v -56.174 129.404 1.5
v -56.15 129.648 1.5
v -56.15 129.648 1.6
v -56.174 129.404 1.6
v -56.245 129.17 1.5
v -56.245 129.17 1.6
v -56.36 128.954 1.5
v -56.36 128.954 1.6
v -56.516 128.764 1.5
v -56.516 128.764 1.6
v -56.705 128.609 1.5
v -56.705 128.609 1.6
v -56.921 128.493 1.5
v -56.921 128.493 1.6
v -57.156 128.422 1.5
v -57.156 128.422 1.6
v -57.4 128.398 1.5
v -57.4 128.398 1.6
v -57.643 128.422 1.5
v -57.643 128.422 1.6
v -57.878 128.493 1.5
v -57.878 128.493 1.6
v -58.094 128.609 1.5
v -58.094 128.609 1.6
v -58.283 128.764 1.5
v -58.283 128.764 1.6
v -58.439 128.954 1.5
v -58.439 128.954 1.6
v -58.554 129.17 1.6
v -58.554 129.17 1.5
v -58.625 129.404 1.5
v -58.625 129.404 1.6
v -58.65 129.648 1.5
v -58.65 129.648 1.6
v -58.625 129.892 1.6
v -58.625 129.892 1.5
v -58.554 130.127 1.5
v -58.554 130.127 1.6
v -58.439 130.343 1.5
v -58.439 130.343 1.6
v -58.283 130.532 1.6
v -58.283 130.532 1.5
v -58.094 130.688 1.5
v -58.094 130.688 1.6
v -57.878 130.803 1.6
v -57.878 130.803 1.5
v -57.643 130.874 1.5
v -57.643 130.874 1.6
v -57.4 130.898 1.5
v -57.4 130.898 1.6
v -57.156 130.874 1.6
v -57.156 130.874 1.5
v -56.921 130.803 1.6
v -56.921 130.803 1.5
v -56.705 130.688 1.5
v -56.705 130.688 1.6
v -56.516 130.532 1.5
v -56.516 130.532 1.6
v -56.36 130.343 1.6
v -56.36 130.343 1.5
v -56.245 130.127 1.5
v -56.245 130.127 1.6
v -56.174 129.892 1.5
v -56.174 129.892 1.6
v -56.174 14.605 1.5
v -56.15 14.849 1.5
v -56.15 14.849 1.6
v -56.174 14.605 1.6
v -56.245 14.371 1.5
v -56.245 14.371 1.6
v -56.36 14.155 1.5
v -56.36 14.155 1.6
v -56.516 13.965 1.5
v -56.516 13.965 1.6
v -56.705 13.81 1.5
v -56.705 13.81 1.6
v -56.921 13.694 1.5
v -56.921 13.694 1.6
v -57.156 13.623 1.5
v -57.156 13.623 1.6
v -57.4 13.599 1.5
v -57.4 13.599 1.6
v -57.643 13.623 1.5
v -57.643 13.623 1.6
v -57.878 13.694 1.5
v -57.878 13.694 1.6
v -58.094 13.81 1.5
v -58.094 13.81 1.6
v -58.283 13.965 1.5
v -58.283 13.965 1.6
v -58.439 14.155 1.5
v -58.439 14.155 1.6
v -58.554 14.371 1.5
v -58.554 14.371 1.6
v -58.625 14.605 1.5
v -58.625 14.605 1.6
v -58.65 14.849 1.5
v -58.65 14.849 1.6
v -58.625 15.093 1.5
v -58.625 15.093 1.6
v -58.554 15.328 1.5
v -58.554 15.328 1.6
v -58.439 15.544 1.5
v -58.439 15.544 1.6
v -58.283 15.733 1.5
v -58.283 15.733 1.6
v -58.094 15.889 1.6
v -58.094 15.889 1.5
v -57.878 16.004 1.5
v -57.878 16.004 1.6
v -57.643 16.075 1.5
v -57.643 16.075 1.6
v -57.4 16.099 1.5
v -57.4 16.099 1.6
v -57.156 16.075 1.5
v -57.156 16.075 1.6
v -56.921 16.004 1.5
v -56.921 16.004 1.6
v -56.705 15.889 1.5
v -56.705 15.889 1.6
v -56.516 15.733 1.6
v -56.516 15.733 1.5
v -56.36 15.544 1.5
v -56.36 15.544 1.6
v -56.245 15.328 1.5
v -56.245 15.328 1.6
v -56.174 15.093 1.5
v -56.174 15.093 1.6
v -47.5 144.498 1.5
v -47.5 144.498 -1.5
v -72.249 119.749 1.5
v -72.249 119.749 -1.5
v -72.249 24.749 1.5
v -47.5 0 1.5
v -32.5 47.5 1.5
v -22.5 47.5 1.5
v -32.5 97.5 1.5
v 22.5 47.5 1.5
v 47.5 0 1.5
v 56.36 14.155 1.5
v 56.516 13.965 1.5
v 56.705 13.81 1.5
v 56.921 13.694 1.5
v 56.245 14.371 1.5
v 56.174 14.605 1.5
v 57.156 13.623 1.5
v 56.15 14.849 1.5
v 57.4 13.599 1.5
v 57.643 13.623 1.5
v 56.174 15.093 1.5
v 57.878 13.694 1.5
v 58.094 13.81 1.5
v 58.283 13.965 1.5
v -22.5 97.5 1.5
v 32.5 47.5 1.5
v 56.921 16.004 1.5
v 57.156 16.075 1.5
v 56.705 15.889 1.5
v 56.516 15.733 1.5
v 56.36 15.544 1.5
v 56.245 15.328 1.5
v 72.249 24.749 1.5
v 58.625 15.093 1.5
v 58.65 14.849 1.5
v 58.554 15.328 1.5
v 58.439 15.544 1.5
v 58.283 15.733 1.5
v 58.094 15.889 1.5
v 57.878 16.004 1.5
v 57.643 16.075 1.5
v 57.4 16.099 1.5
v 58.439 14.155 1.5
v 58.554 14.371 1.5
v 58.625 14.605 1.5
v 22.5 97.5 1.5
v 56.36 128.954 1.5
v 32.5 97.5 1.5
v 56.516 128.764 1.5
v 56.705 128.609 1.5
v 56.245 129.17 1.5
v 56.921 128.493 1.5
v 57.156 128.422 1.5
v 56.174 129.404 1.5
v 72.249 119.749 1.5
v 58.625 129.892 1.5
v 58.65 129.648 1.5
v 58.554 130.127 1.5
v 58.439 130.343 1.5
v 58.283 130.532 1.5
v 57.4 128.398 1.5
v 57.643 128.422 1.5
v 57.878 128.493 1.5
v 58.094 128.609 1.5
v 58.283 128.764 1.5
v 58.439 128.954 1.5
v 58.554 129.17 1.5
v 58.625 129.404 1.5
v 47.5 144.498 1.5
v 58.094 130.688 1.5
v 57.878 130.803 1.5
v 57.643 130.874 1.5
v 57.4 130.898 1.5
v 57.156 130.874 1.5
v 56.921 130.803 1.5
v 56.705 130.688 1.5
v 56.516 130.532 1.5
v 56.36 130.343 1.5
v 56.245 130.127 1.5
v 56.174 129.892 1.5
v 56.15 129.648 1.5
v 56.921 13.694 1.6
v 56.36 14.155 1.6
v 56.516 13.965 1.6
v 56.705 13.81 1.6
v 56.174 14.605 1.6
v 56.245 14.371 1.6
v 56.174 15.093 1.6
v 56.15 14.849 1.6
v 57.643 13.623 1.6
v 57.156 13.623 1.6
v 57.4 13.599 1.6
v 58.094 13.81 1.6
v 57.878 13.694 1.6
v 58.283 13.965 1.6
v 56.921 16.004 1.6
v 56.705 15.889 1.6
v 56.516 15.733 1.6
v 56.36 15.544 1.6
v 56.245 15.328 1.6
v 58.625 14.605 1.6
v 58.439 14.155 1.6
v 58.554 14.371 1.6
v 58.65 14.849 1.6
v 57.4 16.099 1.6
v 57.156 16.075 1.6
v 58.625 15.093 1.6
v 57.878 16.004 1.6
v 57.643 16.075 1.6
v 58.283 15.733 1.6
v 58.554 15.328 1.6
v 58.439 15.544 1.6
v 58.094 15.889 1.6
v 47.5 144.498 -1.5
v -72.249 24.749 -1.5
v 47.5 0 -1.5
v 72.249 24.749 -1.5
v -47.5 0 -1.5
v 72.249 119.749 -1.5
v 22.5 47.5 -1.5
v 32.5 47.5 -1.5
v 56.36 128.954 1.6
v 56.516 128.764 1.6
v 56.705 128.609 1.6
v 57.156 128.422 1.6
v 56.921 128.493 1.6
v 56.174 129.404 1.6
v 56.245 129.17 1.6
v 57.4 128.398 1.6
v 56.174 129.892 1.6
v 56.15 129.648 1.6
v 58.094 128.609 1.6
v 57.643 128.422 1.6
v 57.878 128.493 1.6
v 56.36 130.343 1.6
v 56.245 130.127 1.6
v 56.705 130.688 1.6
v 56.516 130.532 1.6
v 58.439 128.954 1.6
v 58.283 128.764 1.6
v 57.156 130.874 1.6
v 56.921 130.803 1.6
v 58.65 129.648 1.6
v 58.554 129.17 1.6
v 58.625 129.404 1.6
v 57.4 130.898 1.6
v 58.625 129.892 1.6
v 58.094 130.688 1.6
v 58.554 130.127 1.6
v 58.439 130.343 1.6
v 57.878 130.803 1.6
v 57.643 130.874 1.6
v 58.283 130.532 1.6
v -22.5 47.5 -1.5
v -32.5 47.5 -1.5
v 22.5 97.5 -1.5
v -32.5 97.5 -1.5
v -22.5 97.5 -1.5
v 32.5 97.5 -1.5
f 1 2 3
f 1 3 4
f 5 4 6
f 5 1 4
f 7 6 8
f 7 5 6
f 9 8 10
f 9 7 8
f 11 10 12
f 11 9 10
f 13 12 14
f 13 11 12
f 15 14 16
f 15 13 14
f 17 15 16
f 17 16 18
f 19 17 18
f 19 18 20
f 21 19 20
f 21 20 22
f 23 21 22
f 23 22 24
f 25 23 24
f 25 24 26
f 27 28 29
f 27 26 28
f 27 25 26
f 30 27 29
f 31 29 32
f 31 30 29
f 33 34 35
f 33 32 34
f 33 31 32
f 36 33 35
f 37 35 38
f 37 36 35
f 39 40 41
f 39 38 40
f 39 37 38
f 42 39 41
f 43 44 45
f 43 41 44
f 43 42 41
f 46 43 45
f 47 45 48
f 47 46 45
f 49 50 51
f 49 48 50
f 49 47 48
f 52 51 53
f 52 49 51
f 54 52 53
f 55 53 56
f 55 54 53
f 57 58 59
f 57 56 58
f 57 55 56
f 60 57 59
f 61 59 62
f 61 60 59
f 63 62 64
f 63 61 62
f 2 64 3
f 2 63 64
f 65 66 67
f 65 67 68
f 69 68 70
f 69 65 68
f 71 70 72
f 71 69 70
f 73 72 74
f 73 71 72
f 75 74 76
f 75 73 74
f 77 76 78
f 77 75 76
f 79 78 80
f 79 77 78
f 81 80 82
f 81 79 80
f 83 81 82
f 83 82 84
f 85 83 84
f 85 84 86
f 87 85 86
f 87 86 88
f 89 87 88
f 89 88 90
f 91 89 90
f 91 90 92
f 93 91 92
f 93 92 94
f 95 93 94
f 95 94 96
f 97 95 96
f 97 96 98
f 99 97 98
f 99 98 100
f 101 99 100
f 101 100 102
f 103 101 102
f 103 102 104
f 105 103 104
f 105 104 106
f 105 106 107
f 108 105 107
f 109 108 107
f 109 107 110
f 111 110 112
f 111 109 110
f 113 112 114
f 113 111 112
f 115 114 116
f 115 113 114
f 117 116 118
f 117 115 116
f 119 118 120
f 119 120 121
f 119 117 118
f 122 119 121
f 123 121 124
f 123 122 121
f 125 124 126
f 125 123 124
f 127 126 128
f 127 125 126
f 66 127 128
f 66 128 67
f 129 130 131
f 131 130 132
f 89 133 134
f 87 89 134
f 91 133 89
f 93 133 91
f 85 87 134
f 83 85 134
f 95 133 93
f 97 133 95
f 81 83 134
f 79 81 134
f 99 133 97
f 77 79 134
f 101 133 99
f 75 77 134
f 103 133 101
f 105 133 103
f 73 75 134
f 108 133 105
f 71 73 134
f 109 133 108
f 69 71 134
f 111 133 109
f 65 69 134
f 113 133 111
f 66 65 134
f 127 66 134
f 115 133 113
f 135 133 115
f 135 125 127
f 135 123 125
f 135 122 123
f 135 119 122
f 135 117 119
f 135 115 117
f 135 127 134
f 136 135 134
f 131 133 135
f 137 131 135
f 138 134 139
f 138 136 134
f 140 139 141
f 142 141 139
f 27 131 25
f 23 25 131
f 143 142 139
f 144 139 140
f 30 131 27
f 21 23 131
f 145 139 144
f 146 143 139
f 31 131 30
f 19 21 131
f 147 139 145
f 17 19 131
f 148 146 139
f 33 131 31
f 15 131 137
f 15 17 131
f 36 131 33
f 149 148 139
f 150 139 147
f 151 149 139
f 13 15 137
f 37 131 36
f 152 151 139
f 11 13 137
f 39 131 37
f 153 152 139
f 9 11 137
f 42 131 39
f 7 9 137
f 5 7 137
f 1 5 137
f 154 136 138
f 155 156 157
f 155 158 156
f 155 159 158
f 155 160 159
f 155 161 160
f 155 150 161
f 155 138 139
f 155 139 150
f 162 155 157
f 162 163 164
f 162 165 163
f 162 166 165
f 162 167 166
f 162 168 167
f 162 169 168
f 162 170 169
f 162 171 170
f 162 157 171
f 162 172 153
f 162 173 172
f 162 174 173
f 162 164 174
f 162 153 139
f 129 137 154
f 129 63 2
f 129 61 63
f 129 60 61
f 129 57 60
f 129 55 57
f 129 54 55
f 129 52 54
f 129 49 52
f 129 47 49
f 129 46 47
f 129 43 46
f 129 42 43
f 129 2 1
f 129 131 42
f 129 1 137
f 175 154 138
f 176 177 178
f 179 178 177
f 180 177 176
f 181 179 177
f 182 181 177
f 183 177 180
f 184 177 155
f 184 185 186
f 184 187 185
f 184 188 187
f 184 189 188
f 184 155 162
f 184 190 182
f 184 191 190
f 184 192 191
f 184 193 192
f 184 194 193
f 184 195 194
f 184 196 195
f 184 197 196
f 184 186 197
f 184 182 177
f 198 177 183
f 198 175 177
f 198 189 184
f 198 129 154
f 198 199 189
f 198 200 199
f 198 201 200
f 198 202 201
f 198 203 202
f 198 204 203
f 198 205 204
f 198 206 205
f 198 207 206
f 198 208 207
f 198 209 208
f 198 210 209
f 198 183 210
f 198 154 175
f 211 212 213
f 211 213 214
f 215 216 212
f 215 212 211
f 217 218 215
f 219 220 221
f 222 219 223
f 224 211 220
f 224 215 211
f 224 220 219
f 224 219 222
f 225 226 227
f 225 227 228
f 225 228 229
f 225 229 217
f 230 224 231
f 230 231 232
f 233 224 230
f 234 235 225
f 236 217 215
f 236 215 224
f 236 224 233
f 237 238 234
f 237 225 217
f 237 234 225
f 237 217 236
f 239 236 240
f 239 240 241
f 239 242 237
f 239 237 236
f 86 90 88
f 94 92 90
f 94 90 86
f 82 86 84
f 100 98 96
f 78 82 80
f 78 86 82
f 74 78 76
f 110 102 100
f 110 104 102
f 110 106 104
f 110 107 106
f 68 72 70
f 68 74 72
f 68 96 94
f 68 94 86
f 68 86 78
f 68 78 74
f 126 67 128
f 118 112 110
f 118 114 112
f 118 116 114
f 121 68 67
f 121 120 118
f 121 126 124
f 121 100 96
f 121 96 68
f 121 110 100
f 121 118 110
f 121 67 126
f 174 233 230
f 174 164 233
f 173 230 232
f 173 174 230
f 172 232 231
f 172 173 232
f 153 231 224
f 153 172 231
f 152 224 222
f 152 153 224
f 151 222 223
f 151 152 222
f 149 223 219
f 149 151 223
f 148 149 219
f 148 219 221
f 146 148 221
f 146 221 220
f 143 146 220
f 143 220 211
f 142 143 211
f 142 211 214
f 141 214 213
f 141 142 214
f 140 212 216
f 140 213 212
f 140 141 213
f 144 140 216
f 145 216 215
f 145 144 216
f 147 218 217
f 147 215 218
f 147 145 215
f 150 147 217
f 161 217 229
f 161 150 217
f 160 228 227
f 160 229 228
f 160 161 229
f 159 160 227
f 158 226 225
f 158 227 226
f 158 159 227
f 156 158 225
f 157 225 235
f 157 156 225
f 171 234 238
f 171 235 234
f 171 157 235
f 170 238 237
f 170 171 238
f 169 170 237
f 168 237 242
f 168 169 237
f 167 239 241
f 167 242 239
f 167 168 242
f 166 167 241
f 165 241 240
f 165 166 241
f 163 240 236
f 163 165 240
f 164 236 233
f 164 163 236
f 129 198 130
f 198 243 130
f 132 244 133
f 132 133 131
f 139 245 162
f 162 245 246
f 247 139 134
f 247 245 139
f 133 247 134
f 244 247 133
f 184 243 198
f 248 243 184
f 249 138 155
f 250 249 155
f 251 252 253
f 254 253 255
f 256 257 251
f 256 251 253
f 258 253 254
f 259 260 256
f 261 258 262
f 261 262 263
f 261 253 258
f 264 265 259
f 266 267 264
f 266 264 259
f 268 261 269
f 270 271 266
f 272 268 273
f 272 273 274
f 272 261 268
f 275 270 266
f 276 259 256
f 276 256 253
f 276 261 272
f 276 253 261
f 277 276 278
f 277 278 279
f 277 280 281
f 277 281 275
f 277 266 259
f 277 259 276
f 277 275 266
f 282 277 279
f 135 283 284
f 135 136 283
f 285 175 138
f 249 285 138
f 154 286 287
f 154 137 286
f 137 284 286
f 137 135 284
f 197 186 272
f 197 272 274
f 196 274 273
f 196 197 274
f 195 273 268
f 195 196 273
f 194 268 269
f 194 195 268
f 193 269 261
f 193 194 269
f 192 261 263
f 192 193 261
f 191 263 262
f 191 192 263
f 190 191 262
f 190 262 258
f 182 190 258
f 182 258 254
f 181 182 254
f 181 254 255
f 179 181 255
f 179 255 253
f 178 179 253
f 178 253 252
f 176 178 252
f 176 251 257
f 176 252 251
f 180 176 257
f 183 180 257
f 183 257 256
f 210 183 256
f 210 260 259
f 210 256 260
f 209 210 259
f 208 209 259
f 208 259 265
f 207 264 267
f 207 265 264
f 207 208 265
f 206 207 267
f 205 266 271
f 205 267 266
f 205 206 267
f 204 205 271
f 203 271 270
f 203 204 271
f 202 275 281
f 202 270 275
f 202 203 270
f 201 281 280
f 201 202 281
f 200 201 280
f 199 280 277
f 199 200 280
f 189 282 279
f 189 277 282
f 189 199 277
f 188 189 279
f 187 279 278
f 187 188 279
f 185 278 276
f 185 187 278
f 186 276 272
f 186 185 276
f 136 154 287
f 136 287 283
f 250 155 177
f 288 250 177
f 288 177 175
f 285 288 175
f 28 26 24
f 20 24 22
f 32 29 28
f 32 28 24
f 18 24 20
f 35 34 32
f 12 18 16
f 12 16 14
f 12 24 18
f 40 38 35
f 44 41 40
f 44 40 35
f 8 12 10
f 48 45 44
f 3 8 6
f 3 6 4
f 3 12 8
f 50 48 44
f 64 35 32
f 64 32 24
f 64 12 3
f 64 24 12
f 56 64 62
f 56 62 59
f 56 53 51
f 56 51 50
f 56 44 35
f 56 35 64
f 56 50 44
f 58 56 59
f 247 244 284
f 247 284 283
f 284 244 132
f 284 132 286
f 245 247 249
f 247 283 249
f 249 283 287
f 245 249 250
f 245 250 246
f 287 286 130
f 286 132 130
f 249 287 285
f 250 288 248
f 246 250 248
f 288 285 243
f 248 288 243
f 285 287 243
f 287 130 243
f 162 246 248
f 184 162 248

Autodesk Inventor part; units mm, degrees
ref_plane "YZ Plane" through (0, 0, 0) normal (1, 0, 0) x (0, 1, 0)
ref_plane "XZ Plane" through (0, 0, 0) normal (0, 1, 0) x (-1, 0, 0)
ref_plane "XY Plane" through (0, 0, 0) normal (0, 0, 1) x (1, 0, 0)
sketch "Sketch1" plane through (0, 0, 0) normal (0, 0, 1) x (1, 0, 0)
  line L0 (0, 0) -> (-47.5, 0)
  line L1 (-47.5, 0) -> (-72.2487, 24.7487)
  line L2 (-72.2487, 24.7487) -> (-72.2487, 72.2487)
  line L3 (-72.2487, 72.2487) -> (0, 72.2487)
  line L4 (0, 72.2487) -> (0, 0)
  line L5 (0, 144.4975) -> (-47.5, 144.4975)
  line L6 (-47.5, 144.4975) -> (-72.2487, 119.7487)
  line L7 (-72.2487, 119.7487) -> (-72.2487, 72.2487)
  line L8 (0, 0) -> (47.5, 0)
  line L9 (47.5, 0) -> (72.2487, 24.7487)
  line L10 (72.2487, 24.7487) -> (72.2487, 72.2487)
  line L11 (72.2487, 119.7487) -> (72.2487, 72.2487)
  line L12 (47.5, 144.4975) -> (72.2487, 119.7487)
  line L13 (0, 144.4975) -> (47.5, 144.4975)
  dimension "d0" = 47.5
  dimension "d2" = 35
  dimension "d3" = 135
extrude "Extrusion1" add sketch "Sketch1" along normal mid plane 3
sketch "Sketch2" plane through (0, 0, 1.5) normal (0, 0, 1) x (1, 0, 0)
  line L0 (-32.5, 97.5) -> (-22.5, 97.5)
  line L1 (-22.5, 97.5) -> (-22.5, 47.5)
  line L2 (-22.5, 47.5) -> (-32.5, 47.5)
  line L3 (-32.5, 47.5) -> (-32.5, 97.5)
  line L4 (0, 0) -> (0, 144.4975)
  line L5 (-47.5, 144.4975) -> (47.5, 144.4975) projected
  line L6 (-47.5, 0) -> (47.5, 0) projected
  line L7 (32.5, 97.5) -> (22.5, 97.5)
  line L8 (22.5, 97.5) -> (22.5, 47.5)
  line L9 (22.5, 47.5) -> (32.5, 47.5)
  line L10 (32.5, 47.5) -> (32.5, 97.5)
  dimension "d6" = 50
  dimension "d7" = 10
  dimension "d8" = 45
  dimension "d10" = 47.5
extrude "Extrusion2" cut sketch "Sketch2" against normal blind 3
sketch "Sketch3" plane through (0, 0, 1.5) normal (0, 0, 1) x (1, 0, 0)
  line L0 (47.5, 144.4975) -> (-47.5, 144.4975) projected
  line L1 (0, 144.4975) -> (0, 0)
  line L2 (-72.2487, 119.7487) -> (-72.2487, 24.7487) projected
  line L3 (-72.2487, 72.2487) -> (0, 72.2487)
  circle A0 centre (-57.3995, 14.8492) radius 1.25
  line L4 (-72.2487, 24.7487) -> (-47.5, 0) projected
  line L5 (-59.8744, 12.3744) -> (0, 72.2487)
  circle A1 centre (-57.3995, 129.6482) radius 1.25
  circle A2 centre (57.3995, 14.8492) radius 1.25
  circle A3 centre (57.3995, 129.6482) radius 1.25
  dimension "d13" = 2.5
  dimension "d14" = 3.5
extrude "Extrusion3" add sketch "Sketch3" along normal blind 0.1 contours L5 A0 | A0 L5 | A1 | A2 | A3
properties part number "Middle_base"
